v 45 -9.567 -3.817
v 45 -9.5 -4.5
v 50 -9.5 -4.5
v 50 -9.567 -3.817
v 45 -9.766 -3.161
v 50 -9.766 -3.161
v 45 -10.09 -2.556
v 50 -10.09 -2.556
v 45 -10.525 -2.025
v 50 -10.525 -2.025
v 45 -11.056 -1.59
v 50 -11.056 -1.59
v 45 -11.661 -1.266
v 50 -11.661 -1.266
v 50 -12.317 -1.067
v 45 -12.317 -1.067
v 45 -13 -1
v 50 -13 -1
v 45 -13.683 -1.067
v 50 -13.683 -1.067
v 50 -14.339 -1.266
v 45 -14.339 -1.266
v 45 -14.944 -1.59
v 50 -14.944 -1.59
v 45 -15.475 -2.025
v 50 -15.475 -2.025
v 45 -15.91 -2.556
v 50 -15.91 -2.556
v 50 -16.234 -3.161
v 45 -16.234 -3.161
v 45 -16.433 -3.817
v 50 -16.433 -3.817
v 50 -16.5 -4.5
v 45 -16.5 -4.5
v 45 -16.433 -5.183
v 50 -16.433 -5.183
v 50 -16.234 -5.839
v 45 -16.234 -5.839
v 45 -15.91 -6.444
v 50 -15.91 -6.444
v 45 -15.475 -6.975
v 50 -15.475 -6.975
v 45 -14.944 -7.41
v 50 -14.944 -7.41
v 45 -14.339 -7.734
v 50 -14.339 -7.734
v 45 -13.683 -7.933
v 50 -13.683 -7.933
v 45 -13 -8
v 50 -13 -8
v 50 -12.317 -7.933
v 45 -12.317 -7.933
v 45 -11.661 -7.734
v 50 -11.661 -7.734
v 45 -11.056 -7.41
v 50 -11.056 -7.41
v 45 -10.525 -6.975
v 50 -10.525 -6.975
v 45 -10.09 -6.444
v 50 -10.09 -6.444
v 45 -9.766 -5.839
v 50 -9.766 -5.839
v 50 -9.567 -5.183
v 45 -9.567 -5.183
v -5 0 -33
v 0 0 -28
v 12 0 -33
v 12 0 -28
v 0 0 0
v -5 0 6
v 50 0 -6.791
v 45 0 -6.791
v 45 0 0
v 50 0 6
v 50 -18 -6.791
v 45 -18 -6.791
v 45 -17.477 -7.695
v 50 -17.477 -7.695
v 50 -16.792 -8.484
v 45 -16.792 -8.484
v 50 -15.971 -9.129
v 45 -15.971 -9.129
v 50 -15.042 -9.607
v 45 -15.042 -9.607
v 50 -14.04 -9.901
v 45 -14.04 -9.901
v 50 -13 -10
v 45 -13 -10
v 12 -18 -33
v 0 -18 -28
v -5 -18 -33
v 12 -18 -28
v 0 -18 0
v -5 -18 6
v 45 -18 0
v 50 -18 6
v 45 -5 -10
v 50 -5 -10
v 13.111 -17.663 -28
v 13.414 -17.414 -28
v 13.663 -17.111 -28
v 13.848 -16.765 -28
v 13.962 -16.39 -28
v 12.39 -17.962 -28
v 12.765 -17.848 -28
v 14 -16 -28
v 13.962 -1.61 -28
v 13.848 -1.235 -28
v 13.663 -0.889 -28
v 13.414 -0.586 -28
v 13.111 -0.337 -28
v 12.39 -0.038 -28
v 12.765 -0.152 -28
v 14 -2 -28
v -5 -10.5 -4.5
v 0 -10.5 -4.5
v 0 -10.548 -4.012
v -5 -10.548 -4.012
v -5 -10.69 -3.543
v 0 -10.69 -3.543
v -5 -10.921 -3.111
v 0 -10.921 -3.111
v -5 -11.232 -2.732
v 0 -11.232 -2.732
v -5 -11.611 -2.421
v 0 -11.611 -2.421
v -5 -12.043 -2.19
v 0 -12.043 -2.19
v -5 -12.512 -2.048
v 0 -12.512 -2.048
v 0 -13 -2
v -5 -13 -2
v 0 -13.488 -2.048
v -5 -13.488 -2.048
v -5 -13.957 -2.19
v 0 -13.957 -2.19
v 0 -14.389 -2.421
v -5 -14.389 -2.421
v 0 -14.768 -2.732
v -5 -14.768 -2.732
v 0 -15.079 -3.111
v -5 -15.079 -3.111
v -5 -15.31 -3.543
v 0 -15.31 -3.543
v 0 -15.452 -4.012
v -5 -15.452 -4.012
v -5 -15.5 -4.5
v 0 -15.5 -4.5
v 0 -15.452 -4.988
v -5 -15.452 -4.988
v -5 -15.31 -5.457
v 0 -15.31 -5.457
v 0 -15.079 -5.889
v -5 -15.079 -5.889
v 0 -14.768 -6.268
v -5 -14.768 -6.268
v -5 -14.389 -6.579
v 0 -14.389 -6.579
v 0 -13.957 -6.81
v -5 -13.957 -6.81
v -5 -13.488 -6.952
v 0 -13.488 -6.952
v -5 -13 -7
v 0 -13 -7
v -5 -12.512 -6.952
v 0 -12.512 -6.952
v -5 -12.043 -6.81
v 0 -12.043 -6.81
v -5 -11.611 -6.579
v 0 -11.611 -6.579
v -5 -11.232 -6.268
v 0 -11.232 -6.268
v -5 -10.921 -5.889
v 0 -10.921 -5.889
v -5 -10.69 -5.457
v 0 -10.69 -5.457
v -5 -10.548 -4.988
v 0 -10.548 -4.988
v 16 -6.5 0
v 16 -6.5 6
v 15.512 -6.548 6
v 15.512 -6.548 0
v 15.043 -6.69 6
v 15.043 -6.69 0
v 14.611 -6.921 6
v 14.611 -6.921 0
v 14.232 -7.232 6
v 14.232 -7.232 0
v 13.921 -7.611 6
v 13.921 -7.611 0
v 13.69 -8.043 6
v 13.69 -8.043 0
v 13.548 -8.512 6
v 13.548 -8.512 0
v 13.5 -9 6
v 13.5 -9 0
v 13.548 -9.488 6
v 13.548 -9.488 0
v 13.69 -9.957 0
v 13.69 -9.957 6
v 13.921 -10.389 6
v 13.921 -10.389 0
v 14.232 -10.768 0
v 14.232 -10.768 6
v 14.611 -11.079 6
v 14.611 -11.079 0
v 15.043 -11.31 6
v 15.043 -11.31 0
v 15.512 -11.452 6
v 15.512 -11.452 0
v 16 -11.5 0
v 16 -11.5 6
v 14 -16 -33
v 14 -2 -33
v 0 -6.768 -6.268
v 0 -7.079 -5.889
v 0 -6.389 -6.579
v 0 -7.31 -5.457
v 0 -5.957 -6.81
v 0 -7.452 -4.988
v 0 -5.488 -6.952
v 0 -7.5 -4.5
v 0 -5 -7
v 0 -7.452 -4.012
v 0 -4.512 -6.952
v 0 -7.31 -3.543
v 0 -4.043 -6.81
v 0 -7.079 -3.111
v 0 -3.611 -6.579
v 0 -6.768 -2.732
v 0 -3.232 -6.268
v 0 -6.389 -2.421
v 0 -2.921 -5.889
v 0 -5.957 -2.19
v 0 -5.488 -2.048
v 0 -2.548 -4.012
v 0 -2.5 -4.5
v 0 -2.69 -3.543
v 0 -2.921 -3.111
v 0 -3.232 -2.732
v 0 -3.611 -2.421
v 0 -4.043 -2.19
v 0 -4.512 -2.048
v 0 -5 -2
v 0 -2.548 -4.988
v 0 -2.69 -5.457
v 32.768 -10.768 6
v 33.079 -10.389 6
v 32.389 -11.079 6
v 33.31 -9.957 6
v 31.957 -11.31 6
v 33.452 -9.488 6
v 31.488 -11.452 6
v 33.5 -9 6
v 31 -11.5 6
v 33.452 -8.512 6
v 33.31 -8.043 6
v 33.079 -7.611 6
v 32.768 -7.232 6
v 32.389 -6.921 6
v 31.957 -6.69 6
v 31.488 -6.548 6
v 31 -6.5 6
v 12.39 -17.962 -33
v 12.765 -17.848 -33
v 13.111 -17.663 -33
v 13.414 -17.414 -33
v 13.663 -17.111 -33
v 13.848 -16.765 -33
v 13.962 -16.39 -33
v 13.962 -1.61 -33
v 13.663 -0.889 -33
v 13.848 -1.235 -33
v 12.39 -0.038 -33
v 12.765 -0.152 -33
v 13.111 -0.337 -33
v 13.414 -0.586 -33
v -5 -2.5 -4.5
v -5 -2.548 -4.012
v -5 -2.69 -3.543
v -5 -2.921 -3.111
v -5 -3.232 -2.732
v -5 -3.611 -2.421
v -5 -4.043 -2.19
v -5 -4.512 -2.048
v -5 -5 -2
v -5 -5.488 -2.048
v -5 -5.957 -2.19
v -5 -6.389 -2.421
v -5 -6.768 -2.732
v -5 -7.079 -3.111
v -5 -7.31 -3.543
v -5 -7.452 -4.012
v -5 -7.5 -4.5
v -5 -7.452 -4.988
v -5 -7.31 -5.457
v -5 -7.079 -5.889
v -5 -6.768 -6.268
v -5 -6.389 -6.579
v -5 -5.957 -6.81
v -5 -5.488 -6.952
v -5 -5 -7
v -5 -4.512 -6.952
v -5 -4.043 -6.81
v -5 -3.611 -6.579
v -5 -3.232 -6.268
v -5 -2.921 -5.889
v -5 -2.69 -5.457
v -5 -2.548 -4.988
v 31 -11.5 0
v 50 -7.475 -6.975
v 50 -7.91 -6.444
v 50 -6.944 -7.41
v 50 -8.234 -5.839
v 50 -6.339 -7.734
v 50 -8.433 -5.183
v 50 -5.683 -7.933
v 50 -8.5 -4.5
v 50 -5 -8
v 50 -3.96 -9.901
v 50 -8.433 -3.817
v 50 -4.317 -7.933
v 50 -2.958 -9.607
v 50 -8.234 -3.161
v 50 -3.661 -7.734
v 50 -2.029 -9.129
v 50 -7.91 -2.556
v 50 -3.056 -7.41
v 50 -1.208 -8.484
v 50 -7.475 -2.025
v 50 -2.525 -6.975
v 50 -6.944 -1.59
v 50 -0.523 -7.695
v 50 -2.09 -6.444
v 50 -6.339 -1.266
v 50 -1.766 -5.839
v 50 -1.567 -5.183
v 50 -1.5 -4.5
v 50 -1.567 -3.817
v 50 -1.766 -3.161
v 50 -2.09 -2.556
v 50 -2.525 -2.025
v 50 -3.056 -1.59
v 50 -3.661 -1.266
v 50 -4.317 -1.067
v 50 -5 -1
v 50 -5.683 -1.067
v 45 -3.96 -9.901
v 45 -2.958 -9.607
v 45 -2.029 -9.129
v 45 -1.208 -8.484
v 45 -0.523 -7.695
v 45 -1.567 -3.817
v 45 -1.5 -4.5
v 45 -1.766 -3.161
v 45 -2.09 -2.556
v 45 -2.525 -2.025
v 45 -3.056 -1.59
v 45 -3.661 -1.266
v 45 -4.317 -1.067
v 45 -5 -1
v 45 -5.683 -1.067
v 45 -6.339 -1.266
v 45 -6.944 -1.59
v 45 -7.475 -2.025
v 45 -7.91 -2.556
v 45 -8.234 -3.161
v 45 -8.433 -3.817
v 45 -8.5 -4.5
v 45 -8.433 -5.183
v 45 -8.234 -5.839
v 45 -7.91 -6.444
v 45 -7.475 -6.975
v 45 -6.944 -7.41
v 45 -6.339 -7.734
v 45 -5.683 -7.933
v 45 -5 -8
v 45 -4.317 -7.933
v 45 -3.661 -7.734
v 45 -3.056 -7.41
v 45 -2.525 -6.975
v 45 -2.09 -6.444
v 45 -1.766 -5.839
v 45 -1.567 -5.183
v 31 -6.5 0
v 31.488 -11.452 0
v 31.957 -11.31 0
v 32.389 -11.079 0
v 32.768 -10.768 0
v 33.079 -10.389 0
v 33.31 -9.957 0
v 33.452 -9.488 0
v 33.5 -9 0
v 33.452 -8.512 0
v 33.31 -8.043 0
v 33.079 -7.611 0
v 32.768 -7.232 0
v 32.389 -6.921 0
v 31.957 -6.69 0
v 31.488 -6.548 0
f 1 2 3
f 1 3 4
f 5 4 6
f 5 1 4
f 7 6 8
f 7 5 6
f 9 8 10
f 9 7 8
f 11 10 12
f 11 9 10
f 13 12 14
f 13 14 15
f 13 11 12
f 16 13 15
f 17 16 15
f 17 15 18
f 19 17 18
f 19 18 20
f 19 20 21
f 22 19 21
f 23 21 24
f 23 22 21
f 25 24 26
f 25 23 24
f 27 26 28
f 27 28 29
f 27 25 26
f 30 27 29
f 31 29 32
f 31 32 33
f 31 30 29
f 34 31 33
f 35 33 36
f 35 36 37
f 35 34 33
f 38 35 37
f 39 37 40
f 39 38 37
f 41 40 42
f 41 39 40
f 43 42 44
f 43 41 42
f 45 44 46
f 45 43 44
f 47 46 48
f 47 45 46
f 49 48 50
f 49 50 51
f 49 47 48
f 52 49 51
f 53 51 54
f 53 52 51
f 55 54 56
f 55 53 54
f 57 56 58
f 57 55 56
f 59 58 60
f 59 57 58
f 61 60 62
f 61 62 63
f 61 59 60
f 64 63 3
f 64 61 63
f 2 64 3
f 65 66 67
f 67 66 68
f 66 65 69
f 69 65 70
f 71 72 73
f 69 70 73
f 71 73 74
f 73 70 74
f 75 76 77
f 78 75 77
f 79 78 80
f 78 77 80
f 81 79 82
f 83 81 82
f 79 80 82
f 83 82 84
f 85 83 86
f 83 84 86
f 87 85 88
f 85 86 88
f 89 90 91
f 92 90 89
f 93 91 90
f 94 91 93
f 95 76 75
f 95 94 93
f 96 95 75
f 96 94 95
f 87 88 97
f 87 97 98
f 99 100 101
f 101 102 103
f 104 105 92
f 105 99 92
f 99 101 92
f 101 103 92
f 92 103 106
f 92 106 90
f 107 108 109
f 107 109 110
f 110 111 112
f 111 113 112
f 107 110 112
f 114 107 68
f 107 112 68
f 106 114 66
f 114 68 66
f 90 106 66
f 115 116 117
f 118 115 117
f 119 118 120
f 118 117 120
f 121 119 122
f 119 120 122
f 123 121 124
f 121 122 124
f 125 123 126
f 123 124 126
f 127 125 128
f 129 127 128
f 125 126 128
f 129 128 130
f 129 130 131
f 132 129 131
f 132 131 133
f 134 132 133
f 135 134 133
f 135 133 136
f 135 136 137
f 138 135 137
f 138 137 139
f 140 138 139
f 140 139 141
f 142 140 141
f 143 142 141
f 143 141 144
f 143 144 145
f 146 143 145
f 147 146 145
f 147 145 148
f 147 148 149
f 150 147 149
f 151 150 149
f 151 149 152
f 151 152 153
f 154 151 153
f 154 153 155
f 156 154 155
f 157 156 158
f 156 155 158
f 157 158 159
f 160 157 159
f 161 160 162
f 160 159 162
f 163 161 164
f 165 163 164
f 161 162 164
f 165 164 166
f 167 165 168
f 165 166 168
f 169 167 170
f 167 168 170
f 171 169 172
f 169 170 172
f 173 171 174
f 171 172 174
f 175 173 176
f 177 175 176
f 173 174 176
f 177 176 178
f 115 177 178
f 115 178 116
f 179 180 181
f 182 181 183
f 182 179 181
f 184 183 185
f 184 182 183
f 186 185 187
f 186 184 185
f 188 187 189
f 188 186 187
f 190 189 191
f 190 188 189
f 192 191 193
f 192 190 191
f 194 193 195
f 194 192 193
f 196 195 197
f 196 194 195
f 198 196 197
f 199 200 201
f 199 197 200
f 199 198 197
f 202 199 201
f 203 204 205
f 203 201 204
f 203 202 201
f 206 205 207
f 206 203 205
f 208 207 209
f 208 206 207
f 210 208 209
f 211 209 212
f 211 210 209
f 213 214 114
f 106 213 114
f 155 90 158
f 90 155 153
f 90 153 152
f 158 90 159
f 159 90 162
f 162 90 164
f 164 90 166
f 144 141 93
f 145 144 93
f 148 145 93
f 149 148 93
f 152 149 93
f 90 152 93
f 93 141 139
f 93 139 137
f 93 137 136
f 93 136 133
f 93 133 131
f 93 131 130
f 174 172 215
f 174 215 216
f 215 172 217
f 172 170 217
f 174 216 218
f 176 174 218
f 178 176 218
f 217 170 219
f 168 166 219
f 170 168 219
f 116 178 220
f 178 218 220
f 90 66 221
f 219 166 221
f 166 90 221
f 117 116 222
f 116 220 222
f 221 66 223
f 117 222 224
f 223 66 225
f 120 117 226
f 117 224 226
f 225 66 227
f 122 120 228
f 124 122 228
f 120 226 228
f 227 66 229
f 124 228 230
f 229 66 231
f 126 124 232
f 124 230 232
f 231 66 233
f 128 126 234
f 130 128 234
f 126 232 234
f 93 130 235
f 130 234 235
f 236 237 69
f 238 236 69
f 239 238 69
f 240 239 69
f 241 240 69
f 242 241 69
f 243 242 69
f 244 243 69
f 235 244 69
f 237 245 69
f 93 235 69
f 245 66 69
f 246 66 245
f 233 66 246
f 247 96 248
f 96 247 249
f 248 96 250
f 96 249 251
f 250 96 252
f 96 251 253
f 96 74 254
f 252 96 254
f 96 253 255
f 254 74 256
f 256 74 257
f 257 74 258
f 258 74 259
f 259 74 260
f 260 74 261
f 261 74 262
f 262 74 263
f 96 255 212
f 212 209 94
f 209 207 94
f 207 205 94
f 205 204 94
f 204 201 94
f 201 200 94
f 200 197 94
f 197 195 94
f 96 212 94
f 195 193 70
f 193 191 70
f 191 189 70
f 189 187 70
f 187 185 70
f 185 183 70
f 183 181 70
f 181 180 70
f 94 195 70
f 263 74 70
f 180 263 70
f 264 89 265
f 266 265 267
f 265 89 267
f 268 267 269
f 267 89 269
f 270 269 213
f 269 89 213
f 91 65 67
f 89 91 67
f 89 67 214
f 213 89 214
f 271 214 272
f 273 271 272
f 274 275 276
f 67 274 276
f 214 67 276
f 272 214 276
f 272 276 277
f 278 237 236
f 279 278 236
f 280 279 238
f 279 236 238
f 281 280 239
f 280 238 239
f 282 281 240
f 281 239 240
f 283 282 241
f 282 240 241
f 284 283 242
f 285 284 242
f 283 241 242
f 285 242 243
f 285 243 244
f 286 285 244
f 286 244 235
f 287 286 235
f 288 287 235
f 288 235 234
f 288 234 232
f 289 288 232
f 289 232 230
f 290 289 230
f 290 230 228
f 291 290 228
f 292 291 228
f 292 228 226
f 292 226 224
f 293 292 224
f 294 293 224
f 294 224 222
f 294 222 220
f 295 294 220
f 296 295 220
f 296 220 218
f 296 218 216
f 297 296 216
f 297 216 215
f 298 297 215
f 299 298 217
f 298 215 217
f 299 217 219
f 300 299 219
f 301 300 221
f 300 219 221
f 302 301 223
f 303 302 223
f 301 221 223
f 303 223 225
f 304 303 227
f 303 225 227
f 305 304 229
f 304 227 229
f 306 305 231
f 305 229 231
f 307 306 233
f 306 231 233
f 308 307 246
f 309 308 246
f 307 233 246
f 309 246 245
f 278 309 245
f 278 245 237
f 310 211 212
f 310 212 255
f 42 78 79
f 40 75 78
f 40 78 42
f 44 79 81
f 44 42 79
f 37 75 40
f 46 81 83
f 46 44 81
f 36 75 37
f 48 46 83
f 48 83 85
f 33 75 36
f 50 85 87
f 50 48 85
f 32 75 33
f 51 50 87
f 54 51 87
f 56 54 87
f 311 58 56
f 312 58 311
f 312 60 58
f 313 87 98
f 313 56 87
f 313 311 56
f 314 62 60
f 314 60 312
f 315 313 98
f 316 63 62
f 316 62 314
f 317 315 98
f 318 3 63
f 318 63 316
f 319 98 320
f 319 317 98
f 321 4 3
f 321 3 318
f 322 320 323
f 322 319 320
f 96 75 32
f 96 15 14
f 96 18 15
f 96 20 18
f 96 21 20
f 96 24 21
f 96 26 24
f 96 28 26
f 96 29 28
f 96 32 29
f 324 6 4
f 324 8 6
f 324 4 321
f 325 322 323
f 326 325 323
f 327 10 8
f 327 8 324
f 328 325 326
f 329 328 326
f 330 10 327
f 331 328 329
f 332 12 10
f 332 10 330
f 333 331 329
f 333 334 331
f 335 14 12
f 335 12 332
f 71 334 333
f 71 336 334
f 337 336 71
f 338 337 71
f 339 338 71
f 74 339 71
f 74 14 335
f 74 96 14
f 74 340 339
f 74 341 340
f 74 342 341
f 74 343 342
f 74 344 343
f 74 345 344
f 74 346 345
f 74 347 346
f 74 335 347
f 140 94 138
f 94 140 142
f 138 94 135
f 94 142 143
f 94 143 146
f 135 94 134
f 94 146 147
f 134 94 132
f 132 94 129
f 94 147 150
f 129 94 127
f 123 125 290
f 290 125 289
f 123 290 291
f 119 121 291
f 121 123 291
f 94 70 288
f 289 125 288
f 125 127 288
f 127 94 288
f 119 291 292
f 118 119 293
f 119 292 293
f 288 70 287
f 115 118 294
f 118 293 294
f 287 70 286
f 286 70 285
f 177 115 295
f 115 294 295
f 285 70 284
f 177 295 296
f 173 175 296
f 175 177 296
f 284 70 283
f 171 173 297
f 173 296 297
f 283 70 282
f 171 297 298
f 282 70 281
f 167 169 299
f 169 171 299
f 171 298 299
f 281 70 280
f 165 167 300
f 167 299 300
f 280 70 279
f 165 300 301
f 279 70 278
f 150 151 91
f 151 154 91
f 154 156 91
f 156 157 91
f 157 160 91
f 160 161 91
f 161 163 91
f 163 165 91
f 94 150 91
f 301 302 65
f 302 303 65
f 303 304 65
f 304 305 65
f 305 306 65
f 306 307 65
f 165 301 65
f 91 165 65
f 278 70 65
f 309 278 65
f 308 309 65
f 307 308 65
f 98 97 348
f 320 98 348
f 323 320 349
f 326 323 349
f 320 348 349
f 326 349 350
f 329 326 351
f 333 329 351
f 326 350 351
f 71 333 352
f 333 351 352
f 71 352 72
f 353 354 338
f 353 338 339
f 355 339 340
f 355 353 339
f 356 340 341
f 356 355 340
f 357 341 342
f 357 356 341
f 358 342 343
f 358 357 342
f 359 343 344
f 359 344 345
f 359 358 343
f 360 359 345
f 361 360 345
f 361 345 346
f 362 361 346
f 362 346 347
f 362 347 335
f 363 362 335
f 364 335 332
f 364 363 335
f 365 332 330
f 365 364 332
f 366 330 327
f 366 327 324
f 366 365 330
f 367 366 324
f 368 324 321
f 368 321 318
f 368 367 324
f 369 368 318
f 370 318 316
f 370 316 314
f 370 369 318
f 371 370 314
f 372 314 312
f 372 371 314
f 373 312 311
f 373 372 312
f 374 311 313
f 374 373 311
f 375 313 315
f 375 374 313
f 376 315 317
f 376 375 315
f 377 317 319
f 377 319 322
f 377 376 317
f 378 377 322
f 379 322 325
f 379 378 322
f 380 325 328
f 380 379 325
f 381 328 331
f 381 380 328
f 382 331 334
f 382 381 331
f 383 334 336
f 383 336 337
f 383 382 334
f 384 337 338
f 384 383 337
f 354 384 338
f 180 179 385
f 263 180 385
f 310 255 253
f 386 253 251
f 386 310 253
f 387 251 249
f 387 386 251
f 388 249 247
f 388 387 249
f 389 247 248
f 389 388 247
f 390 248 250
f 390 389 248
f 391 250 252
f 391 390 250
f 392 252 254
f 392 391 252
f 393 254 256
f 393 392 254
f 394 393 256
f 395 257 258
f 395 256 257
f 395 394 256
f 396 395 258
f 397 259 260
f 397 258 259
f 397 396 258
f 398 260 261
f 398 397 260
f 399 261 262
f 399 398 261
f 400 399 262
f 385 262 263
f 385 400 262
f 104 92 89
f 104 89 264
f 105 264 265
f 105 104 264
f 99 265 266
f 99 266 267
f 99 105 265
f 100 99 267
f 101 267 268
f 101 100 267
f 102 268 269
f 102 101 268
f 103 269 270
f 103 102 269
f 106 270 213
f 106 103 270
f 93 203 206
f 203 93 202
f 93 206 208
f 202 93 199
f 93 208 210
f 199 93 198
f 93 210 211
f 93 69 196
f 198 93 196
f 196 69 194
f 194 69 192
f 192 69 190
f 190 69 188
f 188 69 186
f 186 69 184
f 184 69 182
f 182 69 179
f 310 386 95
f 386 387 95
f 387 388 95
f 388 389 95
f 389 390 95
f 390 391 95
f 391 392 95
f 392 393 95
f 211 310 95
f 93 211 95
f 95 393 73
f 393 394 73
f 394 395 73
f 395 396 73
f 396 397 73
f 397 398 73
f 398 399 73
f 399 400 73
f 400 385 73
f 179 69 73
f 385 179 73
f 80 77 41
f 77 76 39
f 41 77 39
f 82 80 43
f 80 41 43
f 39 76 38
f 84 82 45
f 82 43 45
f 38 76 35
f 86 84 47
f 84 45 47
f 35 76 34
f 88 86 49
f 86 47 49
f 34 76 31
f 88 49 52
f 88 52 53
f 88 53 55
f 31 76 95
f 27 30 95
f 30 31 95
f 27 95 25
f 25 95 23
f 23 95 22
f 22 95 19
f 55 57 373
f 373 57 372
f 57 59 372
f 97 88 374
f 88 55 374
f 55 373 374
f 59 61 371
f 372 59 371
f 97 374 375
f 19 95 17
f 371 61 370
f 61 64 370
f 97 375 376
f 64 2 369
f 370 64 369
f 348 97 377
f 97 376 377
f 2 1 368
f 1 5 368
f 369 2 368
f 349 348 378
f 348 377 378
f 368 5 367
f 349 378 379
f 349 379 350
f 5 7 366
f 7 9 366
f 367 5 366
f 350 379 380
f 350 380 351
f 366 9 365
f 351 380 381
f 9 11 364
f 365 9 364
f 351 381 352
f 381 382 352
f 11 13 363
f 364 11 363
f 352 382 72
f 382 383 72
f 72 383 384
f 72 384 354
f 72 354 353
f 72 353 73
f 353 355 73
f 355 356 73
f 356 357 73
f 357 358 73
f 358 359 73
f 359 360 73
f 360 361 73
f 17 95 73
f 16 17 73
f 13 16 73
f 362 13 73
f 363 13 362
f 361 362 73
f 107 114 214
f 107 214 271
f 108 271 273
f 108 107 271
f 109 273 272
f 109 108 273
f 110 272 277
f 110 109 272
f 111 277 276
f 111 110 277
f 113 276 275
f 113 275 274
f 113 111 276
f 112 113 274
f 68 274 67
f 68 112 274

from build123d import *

# Parameters (mm, degrees)
PAD004_DEPTH    = 18
POCKET001_DEPTH = 6.001
SKETCH009_R     = 2.5
POCKET002_DEPTH = 5.001
SKETCH020_W     = 5
SKETCH020_H     = 18
PAD011_DEPTH    = 10
SKETCH021_R     = 3.5
POCKET007_DEPTH = 5
POCKET008_DEPTH = 5
POCKET009_DEPTH = 5


with BuildPart() as part:
    # Sketch007 → Pad004 (new body)
    with BuildSketch(Plane.XZ):
        Polygon((0, 0), (45, 0), (50, 0), (50, 6), (-5, 6), (-5, -33), (14, -33), (14, -28), (0, -28), align=None)
    extrude(amount=PAD004_DEPTH)

    # Sketch008 → Pocket001 (cut, through all)
    with BuildSketch(Plane.XY):
        with BuildLine():
            ThreePointArc((16, -6.5), (13.5, -9), (16, -11.5))
            Line((16, -11.5), (31, -11.5))
            ThreePointArc((31, -11.5), (33.5, -9), (31, -6.5))
            Line((16, -6.5), (31, -6.5))
        make_face()
    extrude(amount=POCKET001_DEPTH, mode=Mode.SUBTRACT)

    # Sketch009 → Pocket002 (cut, through all)
    with BuildSketch(Plane.YZ):
        with Locations((-5, -4.5)):
            Circle(SKETCH009_R)
        with Locations((-13, -4.5)):
            Circle(SKETCH009_R)
    extrude(amount=-POCKET002_DEPTH, mode=Mode.SUBTRACT)

    # Sketch020 → Pad011 (join)
    with BuildSketch(Plane.XY):
        with Locations((47.5, -9)):
            Rectangle(SKETCH020_W, SKETCH020_H)
    extrude(amount=-PAD011_DEPTH)

    # Sketch021 → Pocket007 (cut)
    with BuildSketch(Plane.YZ.offset(45)):
        with Locations((-13, -4.5)):
            Circle(SKETCH021_R)
        with Locations((-5, -4.5)):
            Circle(SKETCH021_R)
    extrude(amount=POCKET007_DEPTH, mode=Mode.SUBTRACT)

    # Sketch022 → Pocket008 (cut)
    with BuildSketch(Plane.YZ.offset(45)):
        with BuildLine():
            ThreePointArc((-18, -6.791288), (-15.970515, -9.128827), (-13, -10))
            Line((-18, -10), (-13, -10))
            Line((-18, -6.791288), (-18, -10))
        make_face()
        with BuildLine():
            Line((0, -10), (0, -6.791288))
            ThreePointArc((-5, -10), (-2.029485, -9.128827), (0, -6.791288))
            Line((-5, -10), (0, -10))
        make_face()
    extrude(amount=POCKET008_DEPTH, mode=Mode.SUBTRACT)

    # Sketch023 → Pocket009 (cut)
    with BuildSketch(Plane.XY.offset(-28)):
        with BuildLine():
            ThreePointArc((12, -18), (13.414214, -17.414214), (14, -16))
            Line((14, -18), (14, -16))
            Line((12, -18), (14, -18))
        make_face()
        with BuildLine():
            ThreePointArc((14, -2), (13.414214, -0.585786), (12, 0))
            Line((14, 0), (12, 0))
            Line((14, -2), (14, 0))
        make_face()
    extrude(amount=-POCKET009_DEPTH, mode=Mode.SUBTRACT)


solid = part.part
